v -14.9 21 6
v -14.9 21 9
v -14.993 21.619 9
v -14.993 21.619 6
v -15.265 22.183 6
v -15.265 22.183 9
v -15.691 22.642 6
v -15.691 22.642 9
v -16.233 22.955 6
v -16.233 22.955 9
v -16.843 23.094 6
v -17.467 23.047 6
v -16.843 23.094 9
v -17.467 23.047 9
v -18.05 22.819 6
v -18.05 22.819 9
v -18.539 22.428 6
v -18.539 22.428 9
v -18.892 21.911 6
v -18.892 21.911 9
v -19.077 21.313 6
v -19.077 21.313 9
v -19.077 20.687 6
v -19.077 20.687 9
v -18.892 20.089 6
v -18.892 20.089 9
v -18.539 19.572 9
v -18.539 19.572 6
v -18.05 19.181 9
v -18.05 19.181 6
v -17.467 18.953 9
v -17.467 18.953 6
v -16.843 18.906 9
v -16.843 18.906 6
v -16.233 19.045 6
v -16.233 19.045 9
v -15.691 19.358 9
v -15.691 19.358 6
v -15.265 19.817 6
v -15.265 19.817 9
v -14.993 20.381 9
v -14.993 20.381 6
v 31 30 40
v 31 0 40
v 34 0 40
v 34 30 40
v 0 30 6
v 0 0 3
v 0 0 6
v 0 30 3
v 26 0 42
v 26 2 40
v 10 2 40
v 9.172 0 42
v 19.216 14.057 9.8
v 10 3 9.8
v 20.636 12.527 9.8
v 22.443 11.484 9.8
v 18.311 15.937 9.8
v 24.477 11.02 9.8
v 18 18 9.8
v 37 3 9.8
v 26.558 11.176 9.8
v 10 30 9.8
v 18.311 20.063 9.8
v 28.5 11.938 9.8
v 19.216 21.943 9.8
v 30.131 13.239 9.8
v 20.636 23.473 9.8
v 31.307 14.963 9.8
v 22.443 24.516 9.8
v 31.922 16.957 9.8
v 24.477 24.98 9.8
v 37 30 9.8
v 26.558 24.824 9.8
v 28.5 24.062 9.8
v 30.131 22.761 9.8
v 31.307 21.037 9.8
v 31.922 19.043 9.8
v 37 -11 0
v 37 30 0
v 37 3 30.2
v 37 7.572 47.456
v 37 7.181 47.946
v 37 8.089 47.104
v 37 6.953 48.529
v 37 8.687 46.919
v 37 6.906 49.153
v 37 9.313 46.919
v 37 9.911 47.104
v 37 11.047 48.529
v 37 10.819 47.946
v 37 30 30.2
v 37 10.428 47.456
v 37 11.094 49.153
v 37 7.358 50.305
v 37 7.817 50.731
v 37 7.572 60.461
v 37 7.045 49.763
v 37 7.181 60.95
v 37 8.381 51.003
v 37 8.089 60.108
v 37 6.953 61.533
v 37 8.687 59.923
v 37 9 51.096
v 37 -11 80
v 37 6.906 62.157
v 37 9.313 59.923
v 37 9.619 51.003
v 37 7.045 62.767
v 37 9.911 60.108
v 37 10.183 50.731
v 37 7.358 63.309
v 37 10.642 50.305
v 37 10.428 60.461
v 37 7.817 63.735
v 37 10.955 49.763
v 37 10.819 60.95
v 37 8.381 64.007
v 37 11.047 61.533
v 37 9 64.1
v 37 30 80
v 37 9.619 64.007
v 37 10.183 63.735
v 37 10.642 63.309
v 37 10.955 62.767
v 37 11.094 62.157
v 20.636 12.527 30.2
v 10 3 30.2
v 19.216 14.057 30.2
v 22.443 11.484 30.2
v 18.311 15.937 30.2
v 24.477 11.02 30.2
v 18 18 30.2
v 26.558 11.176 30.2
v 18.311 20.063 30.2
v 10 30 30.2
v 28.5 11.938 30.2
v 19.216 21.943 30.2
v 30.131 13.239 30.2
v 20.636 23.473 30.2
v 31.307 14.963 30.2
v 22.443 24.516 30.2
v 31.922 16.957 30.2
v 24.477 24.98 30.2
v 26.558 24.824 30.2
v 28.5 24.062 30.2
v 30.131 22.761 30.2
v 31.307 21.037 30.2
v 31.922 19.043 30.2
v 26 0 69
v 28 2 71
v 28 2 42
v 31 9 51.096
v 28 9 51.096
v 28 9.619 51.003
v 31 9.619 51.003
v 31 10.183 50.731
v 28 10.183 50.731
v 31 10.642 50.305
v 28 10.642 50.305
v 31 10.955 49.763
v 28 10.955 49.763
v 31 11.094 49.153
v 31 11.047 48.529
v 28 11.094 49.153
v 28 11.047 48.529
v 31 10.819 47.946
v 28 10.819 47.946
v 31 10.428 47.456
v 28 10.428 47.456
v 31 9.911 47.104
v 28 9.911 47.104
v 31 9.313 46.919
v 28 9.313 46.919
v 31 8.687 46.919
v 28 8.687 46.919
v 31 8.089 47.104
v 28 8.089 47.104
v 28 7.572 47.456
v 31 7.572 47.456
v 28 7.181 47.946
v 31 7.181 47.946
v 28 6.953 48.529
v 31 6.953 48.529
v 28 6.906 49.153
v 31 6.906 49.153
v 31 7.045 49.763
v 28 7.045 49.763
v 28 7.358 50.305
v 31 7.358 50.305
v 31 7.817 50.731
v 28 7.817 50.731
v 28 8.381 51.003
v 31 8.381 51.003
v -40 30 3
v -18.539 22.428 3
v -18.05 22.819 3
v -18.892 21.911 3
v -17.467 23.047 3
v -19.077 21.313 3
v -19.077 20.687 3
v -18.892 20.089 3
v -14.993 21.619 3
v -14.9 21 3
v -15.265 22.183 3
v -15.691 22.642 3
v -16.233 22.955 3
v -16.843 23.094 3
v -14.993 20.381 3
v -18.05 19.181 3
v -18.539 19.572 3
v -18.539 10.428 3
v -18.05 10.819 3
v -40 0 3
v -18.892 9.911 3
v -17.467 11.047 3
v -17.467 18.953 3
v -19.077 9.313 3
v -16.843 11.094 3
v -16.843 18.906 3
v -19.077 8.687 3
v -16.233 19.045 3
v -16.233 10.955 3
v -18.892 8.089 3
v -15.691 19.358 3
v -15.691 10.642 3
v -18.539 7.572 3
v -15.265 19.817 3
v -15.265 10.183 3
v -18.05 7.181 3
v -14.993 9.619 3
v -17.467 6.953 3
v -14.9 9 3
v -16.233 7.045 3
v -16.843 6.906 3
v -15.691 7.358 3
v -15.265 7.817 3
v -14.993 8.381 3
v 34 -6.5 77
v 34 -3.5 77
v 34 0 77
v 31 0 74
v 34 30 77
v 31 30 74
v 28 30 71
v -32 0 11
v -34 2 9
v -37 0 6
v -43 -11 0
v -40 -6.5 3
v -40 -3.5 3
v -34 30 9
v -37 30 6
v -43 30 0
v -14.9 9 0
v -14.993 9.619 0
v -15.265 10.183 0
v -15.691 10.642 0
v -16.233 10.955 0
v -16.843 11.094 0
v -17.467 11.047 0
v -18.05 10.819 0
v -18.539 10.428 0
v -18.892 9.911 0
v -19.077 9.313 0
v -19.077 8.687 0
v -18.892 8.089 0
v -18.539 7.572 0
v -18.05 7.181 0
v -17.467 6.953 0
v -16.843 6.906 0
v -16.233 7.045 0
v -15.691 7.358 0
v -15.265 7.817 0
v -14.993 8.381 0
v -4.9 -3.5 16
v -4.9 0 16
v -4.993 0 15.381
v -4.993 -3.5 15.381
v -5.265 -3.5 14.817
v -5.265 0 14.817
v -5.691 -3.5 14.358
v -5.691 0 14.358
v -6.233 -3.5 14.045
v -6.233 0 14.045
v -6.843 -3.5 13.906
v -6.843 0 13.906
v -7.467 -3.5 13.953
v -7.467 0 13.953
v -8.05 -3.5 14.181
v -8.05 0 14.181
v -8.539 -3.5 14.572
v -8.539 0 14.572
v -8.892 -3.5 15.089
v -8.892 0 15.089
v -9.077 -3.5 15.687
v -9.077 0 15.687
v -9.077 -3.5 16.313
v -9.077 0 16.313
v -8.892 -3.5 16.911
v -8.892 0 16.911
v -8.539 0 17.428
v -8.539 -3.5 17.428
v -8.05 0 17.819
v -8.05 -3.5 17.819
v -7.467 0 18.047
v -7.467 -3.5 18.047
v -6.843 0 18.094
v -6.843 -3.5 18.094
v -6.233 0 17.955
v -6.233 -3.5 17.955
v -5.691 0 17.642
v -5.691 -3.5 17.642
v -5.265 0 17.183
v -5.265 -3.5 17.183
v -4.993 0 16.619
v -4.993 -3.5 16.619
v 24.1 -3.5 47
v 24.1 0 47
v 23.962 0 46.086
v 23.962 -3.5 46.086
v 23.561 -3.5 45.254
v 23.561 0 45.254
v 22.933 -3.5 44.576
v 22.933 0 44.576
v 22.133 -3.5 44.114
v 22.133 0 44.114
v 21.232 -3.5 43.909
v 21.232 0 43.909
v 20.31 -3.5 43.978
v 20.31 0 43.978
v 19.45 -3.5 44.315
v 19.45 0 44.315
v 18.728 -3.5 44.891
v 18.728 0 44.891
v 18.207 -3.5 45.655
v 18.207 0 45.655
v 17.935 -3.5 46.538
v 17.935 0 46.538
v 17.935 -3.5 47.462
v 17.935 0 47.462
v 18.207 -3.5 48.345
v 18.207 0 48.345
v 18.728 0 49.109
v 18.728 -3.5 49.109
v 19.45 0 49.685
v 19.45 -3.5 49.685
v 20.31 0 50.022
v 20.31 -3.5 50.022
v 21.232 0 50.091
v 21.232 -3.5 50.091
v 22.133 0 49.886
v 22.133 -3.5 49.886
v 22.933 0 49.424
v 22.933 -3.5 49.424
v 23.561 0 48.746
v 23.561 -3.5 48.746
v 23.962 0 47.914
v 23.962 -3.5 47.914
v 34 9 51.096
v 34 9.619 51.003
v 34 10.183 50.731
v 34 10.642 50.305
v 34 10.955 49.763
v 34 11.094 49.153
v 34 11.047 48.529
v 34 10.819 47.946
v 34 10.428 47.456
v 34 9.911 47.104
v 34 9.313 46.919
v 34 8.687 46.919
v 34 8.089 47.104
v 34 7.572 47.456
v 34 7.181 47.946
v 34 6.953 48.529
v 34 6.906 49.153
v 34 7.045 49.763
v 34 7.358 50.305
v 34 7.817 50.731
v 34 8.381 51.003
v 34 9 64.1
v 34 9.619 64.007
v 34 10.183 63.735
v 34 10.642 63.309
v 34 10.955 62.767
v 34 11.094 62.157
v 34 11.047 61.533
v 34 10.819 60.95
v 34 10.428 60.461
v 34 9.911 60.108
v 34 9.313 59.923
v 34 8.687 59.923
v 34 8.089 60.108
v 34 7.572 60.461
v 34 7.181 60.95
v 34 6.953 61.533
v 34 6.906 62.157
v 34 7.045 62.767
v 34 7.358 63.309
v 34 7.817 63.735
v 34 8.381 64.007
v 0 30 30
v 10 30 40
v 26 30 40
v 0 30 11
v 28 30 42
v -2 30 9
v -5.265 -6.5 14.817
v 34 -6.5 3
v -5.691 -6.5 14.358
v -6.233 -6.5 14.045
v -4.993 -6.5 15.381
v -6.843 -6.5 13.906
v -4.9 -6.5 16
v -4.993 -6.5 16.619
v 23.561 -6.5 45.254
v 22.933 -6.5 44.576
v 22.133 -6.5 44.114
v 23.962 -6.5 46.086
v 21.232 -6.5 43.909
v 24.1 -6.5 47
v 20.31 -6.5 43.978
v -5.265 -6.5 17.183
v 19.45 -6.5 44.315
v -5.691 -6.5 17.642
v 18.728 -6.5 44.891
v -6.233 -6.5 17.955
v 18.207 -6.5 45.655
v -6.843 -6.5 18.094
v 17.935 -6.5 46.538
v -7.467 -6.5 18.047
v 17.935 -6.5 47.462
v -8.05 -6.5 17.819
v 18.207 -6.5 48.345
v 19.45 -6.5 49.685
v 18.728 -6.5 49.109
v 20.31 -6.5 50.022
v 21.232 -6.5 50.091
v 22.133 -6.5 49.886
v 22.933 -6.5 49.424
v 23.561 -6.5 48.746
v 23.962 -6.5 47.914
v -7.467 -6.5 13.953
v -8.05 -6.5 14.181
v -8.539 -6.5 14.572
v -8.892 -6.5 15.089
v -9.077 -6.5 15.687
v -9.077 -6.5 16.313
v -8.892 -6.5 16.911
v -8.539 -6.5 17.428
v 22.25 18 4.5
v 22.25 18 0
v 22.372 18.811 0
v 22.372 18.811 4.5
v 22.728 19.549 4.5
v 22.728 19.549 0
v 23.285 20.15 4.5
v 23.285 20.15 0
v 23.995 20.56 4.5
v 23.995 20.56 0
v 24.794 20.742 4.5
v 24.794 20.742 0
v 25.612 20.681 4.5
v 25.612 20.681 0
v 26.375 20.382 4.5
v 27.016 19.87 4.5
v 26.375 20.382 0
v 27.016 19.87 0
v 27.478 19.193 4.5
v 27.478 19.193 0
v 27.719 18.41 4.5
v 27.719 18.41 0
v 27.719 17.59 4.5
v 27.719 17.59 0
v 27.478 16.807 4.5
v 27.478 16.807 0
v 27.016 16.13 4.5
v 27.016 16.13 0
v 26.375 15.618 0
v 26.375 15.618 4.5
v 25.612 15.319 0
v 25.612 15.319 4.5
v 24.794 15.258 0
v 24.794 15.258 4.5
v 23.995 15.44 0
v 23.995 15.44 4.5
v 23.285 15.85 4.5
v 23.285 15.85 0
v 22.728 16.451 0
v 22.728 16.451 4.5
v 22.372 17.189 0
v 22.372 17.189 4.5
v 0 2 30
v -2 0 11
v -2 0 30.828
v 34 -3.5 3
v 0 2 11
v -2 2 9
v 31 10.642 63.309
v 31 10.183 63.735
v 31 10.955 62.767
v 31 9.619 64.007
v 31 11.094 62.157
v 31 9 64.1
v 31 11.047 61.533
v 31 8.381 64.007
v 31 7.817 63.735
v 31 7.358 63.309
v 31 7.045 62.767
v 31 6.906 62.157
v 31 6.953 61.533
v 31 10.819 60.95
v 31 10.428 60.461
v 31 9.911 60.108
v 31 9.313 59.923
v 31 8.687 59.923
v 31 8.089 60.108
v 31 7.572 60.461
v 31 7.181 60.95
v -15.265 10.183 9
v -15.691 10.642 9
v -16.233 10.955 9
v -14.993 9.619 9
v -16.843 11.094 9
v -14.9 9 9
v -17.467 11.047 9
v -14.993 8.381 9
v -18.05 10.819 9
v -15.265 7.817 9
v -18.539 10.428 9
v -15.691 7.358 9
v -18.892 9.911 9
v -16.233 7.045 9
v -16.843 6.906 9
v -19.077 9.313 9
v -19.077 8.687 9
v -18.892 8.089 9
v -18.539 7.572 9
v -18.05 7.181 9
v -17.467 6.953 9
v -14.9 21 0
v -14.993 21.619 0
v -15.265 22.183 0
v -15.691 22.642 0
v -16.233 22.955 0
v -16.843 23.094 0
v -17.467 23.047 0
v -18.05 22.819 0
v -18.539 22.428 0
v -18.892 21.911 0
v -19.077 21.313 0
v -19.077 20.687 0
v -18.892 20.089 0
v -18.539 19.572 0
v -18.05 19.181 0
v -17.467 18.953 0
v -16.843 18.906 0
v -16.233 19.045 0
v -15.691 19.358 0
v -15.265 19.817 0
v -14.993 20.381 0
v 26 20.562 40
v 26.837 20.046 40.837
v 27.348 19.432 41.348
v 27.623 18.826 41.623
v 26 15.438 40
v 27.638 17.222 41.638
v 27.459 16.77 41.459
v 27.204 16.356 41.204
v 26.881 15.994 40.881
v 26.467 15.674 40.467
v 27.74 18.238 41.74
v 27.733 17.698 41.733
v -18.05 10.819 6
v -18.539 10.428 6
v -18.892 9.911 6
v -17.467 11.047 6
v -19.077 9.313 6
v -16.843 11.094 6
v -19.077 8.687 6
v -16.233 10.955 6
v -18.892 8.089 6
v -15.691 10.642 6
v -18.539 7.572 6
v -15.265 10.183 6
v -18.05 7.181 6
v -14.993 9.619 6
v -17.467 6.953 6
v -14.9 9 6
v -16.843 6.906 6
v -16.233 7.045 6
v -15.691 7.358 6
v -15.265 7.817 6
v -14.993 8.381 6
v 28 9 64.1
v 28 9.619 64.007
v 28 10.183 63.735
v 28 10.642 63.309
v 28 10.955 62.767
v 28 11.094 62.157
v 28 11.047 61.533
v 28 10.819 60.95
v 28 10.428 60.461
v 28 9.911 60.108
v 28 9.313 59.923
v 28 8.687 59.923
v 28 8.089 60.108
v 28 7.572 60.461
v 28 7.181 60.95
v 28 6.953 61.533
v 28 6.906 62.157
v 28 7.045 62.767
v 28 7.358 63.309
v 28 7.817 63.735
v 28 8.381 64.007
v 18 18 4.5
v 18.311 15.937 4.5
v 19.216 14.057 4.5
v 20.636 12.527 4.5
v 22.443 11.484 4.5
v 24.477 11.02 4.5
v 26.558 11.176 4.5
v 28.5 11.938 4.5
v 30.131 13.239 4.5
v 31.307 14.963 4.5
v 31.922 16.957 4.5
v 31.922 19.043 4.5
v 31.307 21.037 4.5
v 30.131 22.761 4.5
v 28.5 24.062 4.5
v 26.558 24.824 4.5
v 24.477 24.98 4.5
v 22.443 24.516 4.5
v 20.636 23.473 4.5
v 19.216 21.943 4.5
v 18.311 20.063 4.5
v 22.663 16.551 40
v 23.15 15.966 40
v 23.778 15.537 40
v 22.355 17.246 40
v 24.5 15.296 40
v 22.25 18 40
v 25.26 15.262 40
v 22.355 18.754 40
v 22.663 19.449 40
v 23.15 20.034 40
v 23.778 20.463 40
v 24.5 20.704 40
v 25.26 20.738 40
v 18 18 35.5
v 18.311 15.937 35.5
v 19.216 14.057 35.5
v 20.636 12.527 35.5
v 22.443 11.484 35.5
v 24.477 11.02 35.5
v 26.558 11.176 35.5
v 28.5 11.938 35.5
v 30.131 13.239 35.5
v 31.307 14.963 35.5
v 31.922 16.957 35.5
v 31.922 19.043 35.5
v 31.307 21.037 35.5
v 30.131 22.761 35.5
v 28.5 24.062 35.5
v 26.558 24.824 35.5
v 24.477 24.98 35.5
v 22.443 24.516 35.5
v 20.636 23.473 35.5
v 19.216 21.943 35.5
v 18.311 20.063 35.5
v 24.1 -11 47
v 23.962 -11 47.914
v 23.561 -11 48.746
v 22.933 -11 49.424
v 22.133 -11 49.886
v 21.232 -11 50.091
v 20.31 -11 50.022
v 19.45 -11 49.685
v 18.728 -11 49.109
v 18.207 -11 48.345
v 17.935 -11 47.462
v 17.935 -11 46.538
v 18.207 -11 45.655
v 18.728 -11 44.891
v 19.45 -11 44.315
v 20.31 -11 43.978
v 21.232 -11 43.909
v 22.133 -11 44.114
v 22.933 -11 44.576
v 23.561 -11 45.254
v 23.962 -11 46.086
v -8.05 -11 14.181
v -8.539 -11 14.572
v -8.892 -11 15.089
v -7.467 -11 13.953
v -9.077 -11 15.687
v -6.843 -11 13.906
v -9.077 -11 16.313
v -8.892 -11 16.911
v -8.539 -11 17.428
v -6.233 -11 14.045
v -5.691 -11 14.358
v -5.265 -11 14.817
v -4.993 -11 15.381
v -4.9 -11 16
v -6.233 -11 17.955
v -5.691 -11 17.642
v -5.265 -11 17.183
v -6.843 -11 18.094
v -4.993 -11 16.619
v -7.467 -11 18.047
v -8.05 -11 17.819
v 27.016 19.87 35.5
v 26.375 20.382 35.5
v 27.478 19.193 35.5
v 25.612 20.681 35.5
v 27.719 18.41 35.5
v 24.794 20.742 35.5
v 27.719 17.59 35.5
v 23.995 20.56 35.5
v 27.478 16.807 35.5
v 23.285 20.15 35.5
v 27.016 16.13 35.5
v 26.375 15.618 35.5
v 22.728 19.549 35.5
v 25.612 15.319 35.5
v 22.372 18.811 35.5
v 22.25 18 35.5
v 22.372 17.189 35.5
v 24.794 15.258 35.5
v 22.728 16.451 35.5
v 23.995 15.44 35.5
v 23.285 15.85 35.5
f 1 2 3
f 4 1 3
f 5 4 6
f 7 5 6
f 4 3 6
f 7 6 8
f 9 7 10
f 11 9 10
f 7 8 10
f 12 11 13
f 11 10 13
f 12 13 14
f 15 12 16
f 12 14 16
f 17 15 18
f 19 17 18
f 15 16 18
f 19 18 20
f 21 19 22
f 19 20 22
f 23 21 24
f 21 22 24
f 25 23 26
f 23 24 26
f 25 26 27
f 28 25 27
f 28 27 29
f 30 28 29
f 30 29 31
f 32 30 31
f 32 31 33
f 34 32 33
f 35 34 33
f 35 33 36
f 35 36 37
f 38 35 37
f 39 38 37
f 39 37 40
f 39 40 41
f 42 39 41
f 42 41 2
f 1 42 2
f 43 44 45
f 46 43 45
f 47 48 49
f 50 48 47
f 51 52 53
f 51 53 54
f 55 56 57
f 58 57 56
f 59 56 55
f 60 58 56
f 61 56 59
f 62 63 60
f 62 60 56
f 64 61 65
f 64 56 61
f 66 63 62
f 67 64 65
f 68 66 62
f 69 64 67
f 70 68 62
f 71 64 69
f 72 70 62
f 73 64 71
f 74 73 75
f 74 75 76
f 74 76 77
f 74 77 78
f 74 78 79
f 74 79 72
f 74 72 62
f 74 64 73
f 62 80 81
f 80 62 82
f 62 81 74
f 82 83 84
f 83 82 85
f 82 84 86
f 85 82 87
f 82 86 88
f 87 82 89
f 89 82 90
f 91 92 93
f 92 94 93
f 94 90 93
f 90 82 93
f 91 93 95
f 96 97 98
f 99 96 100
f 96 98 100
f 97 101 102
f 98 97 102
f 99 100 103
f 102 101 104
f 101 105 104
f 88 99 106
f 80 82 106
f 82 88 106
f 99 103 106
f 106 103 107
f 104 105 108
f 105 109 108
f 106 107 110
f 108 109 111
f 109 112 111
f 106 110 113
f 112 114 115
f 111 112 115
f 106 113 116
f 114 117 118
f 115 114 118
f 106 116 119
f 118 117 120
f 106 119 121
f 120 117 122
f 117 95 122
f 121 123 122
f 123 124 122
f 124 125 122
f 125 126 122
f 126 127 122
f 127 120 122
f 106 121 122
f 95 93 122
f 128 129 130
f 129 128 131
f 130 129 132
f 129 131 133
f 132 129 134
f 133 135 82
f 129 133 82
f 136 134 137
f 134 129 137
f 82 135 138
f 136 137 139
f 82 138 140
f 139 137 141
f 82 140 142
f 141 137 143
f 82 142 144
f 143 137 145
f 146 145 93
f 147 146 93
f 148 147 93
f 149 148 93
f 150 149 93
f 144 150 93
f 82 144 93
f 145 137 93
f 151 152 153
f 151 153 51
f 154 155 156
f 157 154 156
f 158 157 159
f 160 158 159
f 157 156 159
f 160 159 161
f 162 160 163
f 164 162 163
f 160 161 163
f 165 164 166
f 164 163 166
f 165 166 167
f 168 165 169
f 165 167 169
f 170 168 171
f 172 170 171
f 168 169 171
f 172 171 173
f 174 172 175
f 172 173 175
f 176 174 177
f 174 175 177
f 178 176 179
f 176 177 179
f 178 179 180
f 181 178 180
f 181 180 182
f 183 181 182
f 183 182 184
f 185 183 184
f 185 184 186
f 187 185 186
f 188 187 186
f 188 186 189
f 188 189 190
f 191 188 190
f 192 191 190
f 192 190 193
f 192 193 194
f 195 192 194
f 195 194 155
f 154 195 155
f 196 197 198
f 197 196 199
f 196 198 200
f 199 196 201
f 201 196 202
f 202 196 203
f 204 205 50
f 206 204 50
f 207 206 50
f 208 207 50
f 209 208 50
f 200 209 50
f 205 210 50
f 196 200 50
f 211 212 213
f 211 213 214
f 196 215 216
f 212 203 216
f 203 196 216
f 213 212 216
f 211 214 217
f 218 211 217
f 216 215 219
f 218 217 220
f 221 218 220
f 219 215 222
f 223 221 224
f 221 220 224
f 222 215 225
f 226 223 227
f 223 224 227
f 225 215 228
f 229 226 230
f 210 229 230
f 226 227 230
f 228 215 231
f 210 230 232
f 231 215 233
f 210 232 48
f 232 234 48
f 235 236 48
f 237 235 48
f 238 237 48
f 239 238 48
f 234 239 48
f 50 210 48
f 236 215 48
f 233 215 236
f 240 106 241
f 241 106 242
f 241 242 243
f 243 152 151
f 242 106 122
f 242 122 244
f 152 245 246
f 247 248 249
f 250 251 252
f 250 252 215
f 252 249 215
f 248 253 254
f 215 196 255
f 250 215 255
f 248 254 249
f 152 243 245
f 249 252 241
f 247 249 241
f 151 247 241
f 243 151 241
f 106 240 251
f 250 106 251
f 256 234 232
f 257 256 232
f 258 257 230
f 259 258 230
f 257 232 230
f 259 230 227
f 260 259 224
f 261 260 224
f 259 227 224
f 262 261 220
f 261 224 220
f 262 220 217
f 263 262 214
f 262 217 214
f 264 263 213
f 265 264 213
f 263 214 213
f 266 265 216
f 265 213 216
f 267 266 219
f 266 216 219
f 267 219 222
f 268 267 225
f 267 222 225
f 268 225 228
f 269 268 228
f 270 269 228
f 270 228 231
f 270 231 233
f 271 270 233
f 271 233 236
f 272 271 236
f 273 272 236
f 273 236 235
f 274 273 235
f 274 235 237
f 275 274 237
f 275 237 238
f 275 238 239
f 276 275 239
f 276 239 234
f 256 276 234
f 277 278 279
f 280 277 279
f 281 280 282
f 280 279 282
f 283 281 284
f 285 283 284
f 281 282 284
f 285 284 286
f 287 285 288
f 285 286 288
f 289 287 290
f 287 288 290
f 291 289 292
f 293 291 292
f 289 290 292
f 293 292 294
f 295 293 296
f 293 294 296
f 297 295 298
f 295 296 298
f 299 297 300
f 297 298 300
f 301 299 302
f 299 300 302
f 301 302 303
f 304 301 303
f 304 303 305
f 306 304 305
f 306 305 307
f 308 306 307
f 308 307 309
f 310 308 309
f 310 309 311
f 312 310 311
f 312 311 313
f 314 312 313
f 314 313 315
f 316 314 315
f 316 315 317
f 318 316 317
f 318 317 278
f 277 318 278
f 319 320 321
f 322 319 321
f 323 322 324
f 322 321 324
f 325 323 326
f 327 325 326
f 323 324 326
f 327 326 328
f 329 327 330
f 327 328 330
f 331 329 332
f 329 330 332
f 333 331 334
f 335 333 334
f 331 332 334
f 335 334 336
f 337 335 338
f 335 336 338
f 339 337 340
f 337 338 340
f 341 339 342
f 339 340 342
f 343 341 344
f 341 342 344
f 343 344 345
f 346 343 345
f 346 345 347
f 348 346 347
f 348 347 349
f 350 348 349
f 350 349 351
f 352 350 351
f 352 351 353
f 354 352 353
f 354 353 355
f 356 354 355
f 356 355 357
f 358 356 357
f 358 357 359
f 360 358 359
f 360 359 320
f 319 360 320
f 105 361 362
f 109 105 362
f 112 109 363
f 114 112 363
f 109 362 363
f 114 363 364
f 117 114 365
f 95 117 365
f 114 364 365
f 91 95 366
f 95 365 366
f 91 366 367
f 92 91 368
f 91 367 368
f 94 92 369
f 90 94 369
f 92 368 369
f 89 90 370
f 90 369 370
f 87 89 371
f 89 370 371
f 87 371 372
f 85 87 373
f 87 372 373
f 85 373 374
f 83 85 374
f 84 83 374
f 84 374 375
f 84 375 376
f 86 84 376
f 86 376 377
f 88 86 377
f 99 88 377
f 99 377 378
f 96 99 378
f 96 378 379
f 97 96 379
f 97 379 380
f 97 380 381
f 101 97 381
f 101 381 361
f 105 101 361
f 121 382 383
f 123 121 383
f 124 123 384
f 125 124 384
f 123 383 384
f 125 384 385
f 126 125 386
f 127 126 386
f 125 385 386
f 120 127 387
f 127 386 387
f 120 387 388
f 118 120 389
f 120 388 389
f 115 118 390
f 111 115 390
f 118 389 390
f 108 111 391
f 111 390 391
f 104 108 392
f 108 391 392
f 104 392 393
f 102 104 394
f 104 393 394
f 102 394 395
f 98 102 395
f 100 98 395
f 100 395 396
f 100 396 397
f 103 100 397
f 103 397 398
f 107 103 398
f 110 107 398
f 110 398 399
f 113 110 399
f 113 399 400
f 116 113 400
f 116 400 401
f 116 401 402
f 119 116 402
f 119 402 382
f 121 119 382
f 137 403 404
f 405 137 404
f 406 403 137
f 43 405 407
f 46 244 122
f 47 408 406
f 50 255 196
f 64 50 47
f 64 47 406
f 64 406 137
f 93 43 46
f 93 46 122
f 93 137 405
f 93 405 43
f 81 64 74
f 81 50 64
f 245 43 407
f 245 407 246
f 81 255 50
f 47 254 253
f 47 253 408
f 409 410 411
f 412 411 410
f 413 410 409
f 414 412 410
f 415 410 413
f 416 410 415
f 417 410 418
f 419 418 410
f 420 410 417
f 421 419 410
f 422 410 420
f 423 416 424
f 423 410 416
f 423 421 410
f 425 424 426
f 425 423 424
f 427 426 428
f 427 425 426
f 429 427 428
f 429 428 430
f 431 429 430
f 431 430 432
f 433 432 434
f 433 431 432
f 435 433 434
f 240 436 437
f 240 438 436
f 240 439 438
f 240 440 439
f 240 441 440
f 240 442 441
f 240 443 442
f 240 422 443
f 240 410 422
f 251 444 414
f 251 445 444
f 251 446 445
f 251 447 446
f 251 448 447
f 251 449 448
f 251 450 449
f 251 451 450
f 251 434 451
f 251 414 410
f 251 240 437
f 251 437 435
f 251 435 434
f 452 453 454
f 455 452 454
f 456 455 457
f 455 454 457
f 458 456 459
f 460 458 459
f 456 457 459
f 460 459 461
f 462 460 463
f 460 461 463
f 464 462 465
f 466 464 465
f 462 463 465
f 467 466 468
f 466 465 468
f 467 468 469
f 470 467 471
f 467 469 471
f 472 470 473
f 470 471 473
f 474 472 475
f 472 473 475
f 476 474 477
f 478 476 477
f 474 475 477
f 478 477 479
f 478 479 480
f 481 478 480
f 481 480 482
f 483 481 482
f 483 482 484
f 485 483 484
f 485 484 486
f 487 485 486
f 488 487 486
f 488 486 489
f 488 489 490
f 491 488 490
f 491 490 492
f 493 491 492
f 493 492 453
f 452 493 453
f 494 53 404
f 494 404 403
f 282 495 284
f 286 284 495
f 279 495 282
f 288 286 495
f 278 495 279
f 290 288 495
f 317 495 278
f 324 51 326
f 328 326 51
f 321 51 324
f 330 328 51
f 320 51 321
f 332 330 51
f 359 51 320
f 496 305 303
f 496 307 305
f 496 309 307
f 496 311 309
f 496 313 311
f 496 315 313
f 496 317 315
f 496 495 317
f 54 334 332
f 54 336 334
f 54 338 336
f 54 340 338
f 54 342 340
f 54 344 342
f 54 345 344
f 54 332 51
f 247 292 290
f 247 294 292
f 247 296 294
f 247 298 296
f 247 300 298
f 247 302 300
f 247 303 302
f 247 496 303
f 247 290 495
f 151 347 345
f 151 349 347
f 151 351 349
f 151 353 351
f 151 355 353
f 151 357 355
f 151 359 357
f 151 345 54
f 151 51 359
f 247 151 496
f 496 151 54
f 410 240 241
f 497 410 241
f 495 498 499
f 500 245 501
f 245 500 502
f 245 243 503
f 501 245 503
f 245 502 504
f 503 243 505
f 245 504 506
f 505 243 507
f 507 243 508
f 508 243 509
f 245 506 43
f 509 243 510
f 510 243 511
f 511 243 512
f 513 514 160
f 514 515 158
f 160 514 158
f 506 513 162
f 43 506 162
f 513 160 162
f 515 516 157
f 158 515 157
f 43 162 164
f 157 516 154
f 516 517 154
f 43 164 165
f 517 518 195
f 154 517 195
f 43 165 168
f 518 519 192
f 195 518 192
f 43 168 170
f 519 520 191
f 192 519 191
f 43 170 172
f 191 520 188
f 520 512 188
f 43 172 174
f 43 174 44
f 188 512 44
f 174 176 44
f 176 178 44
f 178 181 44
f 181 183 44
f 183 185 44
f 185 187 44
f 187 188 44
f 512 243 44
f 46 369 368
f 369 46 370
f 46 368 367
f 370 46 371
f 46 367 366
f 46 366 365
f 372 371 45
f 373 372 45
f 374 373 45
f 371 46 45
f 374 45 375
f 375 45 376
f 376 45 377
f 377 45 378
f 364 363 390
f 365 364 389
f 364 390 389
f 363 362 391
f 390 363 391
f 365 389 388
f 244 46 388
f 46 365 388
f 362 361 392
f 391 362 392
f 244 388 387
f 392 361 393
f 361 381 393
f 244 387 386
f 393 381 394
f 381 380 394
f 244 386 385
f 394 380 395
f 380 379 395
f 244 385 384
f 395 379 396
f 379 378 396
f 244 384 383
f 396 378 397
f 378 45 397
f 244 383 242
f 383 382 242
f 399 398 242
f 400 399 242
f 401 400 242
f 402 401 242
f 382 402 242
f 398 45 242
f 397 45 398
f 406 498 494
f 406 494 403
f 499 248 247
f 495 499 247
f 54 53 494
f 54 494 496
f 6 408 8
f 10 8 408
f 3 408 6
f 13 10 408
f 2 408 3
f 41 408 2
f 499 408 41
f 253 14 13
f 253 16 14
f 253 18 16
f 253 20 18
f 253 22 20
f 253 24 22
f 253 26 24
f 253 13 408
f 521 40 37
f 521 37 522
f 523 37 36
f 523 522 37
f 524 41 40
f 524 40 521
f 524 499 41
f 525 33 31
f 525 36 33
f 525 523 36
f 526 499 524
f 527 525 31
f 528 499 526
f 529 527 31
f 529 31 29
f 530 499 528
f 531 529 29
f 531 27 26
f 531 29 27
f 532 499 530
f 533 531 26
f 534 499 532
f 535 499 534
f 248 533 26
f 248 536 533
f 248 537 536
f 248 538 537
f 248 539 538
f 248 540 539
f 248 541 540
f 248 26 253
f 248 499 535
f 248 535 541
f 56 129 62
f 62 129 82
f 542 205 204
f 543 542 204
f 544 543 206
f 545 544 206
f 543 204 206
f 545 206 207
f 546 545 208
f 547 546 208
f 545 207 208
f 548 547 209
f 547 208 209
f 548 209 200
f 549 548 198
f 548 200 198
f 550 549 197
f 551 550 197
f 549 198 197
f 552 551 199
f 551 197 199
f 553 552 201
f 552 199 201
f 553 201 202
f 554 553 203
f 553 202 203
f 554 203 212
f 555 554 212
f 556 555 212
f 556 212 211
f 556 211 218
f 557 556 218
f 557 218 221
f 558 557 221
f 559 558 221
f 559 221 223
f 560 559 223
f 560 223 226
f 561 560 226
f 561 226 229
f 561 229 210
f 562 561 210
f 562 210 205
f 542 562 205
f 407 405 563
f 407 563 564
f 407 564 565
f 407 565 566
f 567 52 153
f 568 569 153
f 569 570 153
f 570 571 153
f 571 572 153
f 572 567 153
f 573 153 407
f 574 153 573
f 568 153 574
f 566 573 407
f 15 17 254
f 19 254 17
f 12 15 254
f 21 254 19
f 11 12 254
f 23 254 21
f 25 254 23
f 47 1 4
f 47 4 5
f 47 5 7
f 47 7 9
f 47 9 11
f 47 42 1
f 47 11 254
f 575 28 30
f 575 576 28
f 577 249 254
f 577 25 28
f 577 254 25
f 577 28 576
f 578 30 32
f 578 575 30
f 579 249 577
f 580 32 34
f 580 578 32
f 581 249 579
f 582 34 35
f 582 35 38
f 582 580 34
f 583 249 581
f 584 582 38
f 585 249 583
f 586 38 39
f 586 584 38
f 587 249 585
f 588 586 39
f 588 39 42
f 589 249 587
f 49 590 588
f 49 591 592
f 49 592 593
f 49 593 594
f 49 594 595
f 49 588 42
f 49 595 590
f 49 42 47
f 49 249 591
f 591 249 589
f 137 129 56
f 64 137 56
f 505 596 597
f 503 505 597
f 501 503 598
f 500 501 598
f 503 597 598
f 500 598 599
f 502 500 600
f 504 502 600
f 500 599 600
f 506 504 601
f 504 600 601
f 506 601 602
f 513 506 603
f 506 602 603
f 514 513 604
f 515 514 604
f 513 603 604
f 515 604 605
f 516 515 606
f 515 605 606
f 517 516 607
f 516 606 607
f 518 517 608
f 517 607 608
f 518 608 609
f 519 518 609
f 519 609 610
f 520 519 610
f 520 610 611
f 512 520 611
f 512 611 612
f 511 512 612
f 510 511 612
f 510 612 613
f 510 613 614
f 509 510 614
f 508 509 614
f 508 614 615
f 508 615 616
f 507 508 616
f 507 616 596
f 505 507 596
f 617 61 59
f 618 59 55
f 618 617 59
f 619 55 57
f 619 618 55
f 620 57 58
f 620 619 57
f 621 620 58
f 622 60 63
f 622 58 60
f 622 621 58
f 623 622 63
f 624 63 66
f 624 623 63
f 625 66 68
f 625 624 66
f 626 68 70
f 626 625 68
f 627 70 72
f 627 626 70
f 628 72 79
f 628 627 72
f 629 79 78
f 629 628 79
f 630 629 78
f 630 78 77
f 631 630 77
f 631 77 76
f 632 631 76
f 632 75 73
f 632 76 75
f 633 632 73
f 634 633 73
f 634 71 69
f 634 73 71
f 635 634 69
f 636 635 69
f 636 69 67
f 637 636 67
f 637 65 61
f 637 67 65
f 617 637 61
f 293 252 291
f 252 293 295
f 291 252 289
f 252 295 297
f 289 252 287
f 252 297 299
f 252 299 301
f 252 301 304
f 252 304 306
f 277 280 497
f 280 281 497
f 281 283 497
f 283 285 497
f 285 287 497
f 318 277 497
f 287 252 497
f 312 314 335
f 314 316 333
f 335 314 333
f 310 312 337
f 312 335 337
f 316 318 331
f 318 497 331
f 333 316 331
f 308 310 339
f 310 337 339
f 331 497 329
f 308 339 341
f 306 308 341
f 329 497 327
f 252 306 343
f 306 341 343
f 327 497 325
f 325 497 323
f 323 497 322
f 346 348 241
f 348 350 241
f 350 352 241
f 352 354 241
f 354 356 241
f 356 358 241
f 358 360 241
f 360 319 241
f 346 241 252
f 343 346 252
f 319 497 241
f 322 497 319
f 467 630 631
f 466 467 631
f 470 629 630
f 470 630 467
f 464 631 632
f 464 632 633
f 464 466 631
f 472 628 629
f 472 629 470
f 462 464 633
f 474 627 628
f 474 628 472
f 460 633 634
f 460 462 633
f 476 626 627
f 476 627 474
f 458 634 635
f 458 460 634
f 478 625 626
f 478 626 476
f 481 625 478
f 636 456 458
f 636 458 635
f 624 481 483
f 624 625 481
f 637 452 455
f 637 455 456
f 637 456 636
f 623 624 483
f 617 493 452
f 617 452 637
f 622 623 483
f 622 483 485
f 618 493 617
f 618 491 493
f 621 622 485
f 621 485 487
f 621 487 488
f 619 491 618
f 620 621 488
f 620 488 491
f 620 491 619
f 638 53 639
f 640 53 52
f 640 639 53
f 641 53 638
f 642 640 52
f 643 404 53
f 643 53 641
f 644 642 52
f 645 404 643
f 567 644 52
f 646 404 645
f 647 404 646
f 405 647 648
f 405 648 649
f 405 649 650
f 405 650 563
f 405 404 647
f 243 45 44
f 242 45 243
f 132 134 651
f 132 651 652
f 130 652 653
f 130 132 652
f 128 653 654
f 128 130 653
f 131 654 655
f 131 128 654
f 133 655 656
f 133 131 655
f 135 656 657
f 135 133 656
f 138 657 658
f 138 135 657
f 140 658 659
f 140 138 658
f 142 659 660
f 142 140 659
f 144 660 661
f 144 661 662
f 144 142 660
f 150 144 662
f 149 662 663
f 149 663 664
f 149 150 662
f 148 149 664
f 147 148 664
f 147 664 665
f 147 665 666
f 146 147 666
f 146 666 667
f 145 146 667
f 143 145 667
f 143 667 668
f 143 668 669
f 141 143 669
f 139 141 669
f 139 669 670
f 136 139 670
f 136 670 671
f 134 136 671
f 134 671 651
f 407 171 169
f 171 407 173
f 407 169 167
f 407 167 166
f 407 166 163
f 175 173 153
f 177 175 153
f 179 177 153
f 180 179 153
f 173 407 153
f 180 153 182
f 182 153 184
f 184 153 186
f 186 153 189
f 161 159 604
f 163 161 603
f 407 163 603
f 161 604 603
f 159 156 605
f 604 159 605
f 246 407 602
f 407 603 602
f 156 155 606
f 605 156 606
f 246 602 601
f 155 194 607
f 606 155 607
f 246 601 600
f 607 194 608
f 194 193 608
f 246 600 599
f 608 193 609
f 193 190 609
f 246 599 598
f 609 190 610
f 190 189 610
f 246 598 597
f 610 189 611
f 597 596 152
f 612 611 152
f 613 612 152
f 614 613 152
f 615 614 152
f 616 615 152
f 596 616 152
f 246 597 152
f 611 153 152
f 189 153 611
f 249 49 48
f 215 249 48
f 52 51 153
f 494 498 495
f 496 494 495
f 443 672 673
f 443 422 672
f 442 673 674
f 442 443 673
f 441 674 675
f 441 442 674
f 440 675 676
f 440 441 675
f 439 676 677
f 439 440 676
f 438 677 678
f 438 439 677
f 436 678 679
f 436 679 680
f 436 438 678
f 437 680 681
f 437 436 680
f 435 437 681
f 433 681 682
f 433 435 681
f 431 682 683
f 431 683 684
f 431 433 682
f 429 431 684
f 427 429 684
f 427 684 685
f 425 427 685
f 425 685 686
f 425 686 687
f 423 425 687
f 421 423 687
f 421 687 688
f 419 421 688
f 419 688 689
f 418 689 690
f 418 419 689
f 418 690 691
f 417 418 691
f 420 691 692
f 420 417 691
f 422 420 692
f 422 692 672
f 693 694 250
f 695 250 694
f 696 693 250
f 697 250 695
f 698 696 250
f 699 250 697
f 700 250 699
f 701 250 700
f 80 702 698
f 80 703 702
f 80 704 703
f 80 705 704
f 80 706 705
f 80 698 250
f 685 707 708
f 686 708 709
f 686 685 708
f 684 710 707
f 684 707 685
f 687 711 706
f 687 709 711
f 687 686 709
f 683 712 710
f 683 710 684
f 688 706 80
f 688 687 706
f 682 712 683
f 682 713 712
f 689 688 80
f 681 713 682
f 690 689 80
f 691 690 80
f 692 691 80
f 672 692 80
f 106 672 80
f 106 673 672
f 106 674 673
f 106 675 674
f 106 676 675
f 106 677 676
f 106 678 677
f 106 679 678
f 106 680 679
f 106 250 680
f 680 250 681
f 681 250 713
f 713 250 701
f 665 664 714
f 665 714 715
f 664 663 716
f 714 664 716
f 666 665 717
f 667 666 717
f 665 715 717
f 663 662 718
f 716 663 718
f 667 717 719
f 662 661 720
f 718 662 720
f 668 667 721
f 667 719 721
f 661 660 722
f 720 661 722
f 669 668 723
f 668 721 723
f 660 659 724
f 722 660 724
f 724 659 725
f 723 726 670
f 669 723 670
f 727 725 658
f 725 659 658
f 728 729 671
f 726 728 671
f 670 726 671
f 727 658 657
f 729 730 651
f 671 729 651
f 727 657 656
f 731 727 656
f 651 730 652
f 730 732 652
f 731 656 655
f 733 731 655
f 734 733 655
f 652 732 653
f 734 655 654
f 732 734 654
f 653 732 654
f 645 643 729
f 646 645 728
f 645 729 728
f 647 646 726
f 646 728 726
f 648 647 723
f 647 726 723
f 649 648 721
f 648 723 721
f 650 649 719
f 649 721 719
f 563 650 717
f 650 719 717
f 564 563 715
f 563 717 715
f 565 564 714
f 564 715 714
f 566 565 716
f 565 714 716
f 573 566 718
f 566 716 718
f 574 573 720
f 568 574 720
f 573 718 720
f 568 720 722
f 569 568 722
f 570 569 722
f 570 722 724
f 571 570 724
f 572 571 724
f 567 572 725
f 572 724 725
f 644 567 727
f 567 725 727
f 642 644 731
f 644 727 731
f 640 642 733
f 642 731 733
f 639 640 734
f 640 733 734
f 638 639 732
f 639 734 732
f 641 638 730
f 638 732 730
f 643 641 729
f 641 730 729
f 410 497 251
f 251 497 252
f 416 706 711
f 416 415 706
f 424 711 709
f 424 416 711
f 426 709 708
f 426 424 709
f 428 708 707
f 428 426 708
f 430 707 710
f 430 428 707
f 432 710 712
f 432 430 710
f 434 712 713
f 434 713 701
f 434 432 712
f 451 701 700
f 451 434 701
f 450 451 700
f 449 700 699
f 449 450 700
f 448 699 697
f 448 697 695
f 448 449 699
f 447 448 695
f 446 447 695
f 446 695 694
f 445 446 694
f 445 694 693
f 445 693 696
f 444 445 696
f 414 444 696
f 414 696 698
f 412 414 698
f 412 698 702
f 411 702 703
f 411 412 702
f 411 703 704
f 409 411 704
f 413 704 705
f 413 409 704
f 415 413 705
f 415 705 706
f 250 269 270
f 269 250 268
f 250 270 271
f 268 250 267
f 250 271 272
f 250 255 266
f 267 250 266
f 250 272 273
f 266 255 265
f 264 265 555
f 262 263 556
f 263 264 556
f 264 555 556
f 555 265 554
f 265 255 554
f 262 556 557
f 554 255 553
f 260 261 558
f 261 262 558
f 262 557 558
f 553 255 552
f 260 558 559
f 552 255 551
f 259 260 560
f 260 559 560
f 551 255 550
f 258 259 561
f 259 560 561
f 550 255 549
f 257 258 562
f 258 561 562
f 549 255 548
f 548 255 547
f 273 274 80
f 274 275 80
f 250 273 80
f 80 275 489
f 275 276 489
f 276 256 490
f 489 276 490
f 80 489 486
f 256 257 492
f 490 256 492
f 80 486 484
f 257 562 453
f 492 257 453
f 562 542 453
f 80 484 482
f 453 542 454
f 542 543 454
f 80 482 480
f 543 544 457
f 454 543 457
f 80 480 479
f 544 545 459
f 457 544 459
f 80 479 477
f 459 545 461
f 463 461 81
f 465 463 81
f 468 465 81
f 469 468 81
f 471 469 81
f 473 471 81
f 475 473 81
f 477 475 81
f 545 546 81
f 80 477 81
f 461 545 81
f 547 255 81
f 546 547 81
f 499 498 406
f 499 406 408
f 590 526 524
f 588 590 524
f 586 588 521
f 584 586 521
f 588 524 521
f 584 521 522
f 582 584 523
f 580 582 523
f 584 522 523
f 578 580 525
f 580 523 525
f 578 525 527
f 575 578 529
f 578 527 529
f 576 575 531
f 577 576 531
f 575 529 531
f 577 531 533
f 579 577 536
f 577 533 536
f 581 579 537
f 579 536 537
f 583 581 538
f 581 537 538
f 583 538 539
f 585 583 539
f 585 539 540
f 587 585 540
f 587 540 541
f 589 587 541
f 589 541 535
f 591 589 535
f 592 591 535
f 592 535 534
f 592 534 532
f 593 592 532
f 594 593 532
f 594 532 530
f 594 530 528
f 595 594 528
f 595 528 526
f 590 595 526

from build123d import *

# Parameters (mm, degrees)
SZKIC1_W                        = 37
SZKIC1_H                        = 30
DODANIE_WYCI_GNI_CIE1_DEPTH     = 40
SZKIC2_W                        = 27
SZKIC2_H                        = 20.4
WYTNIJ_WYCI_GNI_CIE1_DEPTH      = 30
WYTNIJ_WYCI_GNI_CIE2_DEPTH      = 15.5
WYTNIJ_WYCI_GNI_CIE2_DEPTH_BACK = 15.5
SZKIC3_R                        = 7
SZKIC4_R                        = 2.75
WYTNIJ_WYCI_GNI_CIE3_DEPTH      = 63.20128616
SZKIC5_W                        = 27
SZKIC5_H                        = 20.4
DODANIE_WYCI_GNI_CIE2_DEPTH     = 3
DODANIE_WYCI_GNI_CIE3_DEPTH     = 10
SZKIC8_W                        = 74
SZKIC8_H                        = 3
WYTNIJ_WYCI_GNI_CIE4_DEPTH      = 77
DODANIE_WYCI_GNI_CIE4_DEPTH     = 30
DODANIE_WYCI_GNI_CIE5_DEPTH     = 30
SZKIC11_R                       = 2.1
SZKIC11_R_2                     = 3.1
WYTNIJ_WYCI_GNI_CIE5_DEPTH      = 77
SZKIC12_R                       = 2.1
WYTNIJ_WYCI_GNI_CIE6_DEPTH      = 77
SFAZOWANIE2_SIZE                = 10
SFAZOWANIE3_SIZE                = 2
SZKIC13_R                       = 2.1
WYTNIJ_WYCI_GNI_CIE7_DEPTH      = 77
SZKIC14_R                       = 3.1
SZKIC14_R_2                     = 2.1
DODANIE_WYCI_GNI_CIE6_DEPTH     = 1


with BuildPart() as part:
    # Szkic1 → Dodanie-wyciągnięcie1 (new body)
    with BuildSketch(Plane.XY):
        with Locations((18.5, 15)):
            Rectangle(SZKIC1_W, SZKIC1_H)
    extrude(amount=DODANIE_WYCI_GNI_CIE1_DEPTH)

    # Szkic2 → Wytnij-wyciągnięcie1 (cut)
    with BuildSketch(Plane(origin=(0, 30, 0), x_dir=(1, 0, 0), z_dir=(0, 1, 0))):
        with Locations((23.5, -20)):
            Rectangle(SZKIC2_W, SZKIC2_H)
    extrude(amount=-WYTNIJ_WYCI_GNI_CIE1_DEPTH, mode=Mode.SUBTRACT)

    # Szkic3 → Wytnij-wyciągnięcie2 (cut, two sides: drawn at the far end of the back side and taken through both)
    with BuildSketch(Plane.XY.offset(20).offset(-WYTNIJ_WYCI_GNI_CIE2_DEPTH_BACK)):
        with Locations(Location((25, 18, 0), (0, 0, 180))):
            Circle(SZKIC3_R)
    extrude(amount=WYTNIJ_WYCI_GNI_CIE2_DEPTH + WYTNIJ_WYCI_GNI_CIE2_DEPTH_BACK, mode=Mode.SUBTRACT)

    # Szkic4 → Wytnij-wyciągnięcie3 (cut, through all)
    with BuildSketch(Plane(origin=(0, 0, 0), x_dir=(-1, 0, 0), z_dir=(0, 0, -1))):
        with Locations((-25, 18)):
            Circle(SZKIC4_R)
    extrude(amount=-WYTNIJ_WYCI_GNI_CIE3_DEPTH, mode=Mode.SUBTRACT)

    # Szkic5 → Dodanie-wyciągnięcie2 (add)
    with BuildSketch(Plane.XZ):
        with Locations((23.5, 20)):
            Rectangle(SZKIC5_W, SZKIC5_H)
    extrude(amount=-DODANIE_WYCI_GNI_CIE2_DEPTH)

    # Szkic6 → Dodanie-wyciągnięcie3 (add)
    with BuildSketch(Plane.XZ):
        Polygon((37, 0), (-43, 0), (37, 80), align=None)
    extrude(amount=DODANIE_WYCI_GNI_CIE3_DEPTH)

    # Szkic8 → Wytnij-wyciągnięcie4 (cut)
    with BuildSketch(Plane(origin=(0, 0, 80), x_dir=(-1, 0, 0), z_dir=(0, 0, -1))):
        with Locations((3, -5)):
            Rectangle(SZKIC8_W, SZKIC8_H)
    extrude(amount=WYTNIJ_WYCI_GNI_CIE4_DEPTH, mode=Mode.SUBTRACT)

    # Szkic9 → Dodanie-wyciągnięcie4 (add)
    with BuildSketch(Plane(origin=(0, 0, 0), x_dir=(1, 0, 0), z_dir=(0, 1, 0))):
        Polygon((0, 0), (-43, 0), (-40, -3), (0, -3), align=None)
        Polygon((0, -6), (0, -9), (-34, -9), (-37, -6), align=None)
    extrude(amount=DODANIE_WYCI_GNI_CIE4_DEPTH)

    # Szkic10 → Dodanie-wyciągnięcie5 (add)
    with BuildSketch(Plane(origin=(0, 0, 0), x_dir=(1, 0, 0), z_dir=(0, 1, 0))):
        Polygon((31, -74), (31, -40), (28, -40), (28, -71), align=None)
        Polygon((37, -80), (37, -40), (34, -40), (34, -77), align=None)
    extrude(amount=DODANIE_WYCI_GNI_CIE5_DEPTH)

    # Szkic11 → Wytnij-wyciągnięcie5 (cut)
    with BuildSketch(Plane(origin=(0, 0, 0), x_dir=(1, 0, 0), z_dir=(0, 1, 0))):
        with Locations((-7, -16)):
            Circle(SZKIC11_R)
        with Locations((21, -47)):
            Circle(SZKIC11_R_2)
    extrude(amount=-WYTNIJ_WYCI_GNI_CIE5_DEPTH, mode=Mode.SUBTRACT)

    # Szkic12 → Wytnij-wyciągnięcie6 (cut)
    with BuildSketch(Plane.XY.offset(9)):
        with Locations((-17, 21)):
            Circle(SZKIC12_R)
        with Locations((-17, 9)):
            Circle(SZKIC12_R)
    extrude(amount=-WYTNIJ_WYCI_GNI_CIE6_DEPTH, mode=Mode.SUBTRACT)

    # Sfazowanie2
    sfazowanie2_edges = [part.edges().sort_by_distance(p)[0] for p in [
        (0, 15, 40),
    ]]
    chamfer(sfazowanie2_edges, length=SFAZOWANIE2_SIZE)

    # Sfazowanie3
    # the kernel refuses this chamfer: 2 mm, written as the material it adds along each edge
    with BuildSketch(Plane(origin=(-1.333333333, 1.333333333, 10.333333333), x_dir=(0.7071067811865475, 0.7071067811865475, 0), z_dir=(0.5773502691896258, -0.5773502691896258, -0.5773502691896256))) as sfazowanie3_piece_1_section:
        Polygon((-1.414213562, 0.816496581), (1.414213562, 0.816496581), (0, -1.632993162), align=None)
    sfazowanie3_piece_1 = extrude(amount=2.540341184, mode=Mode.PRIVATE)
    sfazowanie3_piece_1 = split(sfazowanie3_piece_1, bisect_by=Plane(origin=(0, 0, 9), z_dir=(0, 1, 0)), keep=Keep.TOP, mode=Mode.PRIVATE)
    sfazowanie3_piece_1 = split(sfazowanie3_piece_1, bisect_by=Plane(origin=(0, 0, 9), z_dir=(-1, 0, 0)), keep=Keep.TOP, mode=Mode.PRIVATE)
    sfazowanie3_piece_1 = split(sfazowanie3_piece_1, bisect_by=Plane(origin=(0, 0, 9), z_dir=(0, 0, 1)), keep=Keep.TOP, mode=Mode.PRIVATE)
    add(sfazowanie3_piece_1)
    with BuildSketch(Plane(origin=(26.666666667, 1.333333333, 41.333333333), x_dir=(0, -0.7071067811865475, 0.7071067811865475), z_dir=(0.5773502691896257, -0.5773502691896258, -0.5773502691896258))) as sfazowanie3_piece_2_section:
        Polygon((-1.414213562, 0.816496581), (1.414213562, 0.816496581), (0, -1.632993162), align=None)
    sfazowanie3_piece_2 = extrude(amount=2.540341184, mode=Mode.PRIVATE)
    sfazowanie3_piece_2 = split(sfazowanie3_piece_2, bisect_by=Plane(origin=(28, 0, 40), z_dir=(0, 0, 1)), keep=Keep.TOP, mode=Mode.PRIVATE)
    sfazowanie3_piece_2 = split(sfazowanie3_piece_2, bisect_by=Plane(origin=(28, 0, 40), z_dir=(0, 1, 0)), keep=Keep.TOP, mode=Mode.PRIVATE)
    sfazowanie3_piece_2 = split(sfazowanie3_piece_2, bisect_by=Plane(origin=(28, 0, 40), z_dir=(-1, 0, 0)), keep=Keep.TOP, mode=Mode.PRIVATE)
    add(sfazowanie3_piece_2)
    with BuildSketch(Plane(origin=(0, -5.143365976, 9), x_dir=(0, 0, 1), z_dir=(0, 1, 0))) as sfazowanie3_piece_3_section:
        Polygon((SFAZOWANIE3_SIZE, 0), (0, -SFAZOWANIE3_SIZE), (0, 0), align=None)
    sfazowanie3_piece_3 = extrude(amount=35.143365976, mode=Mode.PRIVATE)
    sfazowanie3_piece_3 = split(sfazowanie3_piece_3, bisect_by=Plane(origin=(0, -3.5, 9), z_dir=(0, 1, 0)), keep=Keep.TOP, mode=Mode.PRIVATE)
    add(sfazowanie3_piece_3)
    with BuildSketch(Plane(origin=(5.143365976, 0, 9), x_dir=(0, 1, 0), z_dir=(-1, 0, 0))) as sfazowanie3_piece_4_section:
        Polygon((SFAZOWANIE3_SIZE, 0), (0, -SFAZOWANIE3_SIZE), (0, 0), align=None)
    sfazowanie3_piece_4 = extrude(amount=44.286731952, mode=Mode.PRIVATE)
    sfazowanie3_piece_4 = split(sfazowanie3_piece_4, bisect_by=Plane(origin=(-14.428317012, 0, 28.571682988), z_dir=(0.7071067811865476, 0, -0.7071067811865475)), keep=Keep.TOP, mode=Mode.PRIVATE)
    add(sfazowanie3_piece_4)
    with BuildSketch(Plane(origin=(28, -5.143365976, 40), x_dir=(-1, 0, 0), z_dir=(0, 1, 0))) as sfazowanie3_piece_5_section:
        Polygon((SFAZOWANIE3_SIZE, 0), (0, SFAZOWANIE3_SIZE), (0, 0), align=None)
    sfazowanie3_piece_5 = extrude(amount=35.143365976, mode=Mode.PRIVATE)
    sfazowanie3_piece_5 = sfazowanie3_piece_5 - Plane(origin=(25, 18, 40), x_dir=(-1, 0, 0), z_dir=(0, 0, -1)) * Cylinder(2.75, 79, mode=Mode.PRIVATE)
    sfazowanie3_piece_5 = split(sfazowanie3_piece_5, bisect_by=Plane(origin=(28, -3.5, 40), z_dir=(0, 1, 0)), keep=Keep.TOP, mode=Mode.PRIVATE)
    add(sfazowanie3_piece_5)
    with BuildSketch(Plane(origin=(28, 0, 34.856634024), x_dir=(0, 1, 0), z_dir=(0, 0, 1))) as sfazowanie3_piece_6_section:
        Polygon((SFAZOWANIE3_SIZE, 0), (0, SFAZOWANIE3_SIZE), (0, 0), align=None)
    sfazowanie3_piece_6 = extrude(amount=41.286731952, mode=Mode.PRIVATE)
    sfazowanie3_piece_6 = split(sfazowanie3_piece_6, bisect_by=Plane(origin=(9.928317012, 0, 52.928317012), z_dir=(0.7071067811865476, 0, -0.7071067811865475)), keep=Keep.TOP, mode=Mode.PRIVATE)
    add(sfazowanie3_piece_6)
    with BuildSketch(Plane(origin=(4.856634024, 0, 40), x_dir=(0, 1, 0), z_dir=(1, 0, 0))) as sfazowanie3_piece_7_section:
        Polygon((SFAZOWANIE3_SIZE, 0), (0, SFAZOWANIE3_SIZE), (0, 0), align=None)
    sfazowanie3_piece_7 = extrude(amount=28.286731952, mode=Mode.PRIVATE)
    sfazowanie3_piece_7 = split(sfazowanie3_piece_7, bisect_by=Plane(origin=(7.428317012, 0, 37.428317012), z_dir=(0.7071067811865476, 0, -0.7071067811865476)), keep=Keep.TOP, mode=Mode.PRIVATE)
    sfazowanie3_piece_7 = split(sfazowanie3_piece_7, bisect_by=Plane(origin=(31, 0, 40), z_dir=(-1, 0, 0)), keep=Keep.TOP, mode=Mode.PRIVATE)
    add(sfazowanie3_piece_7)
    with BuildSketch(Plane(origin=(0, 0, 3.856634024), x_dir=(0, 1, 0), z_dir=(0, 0, 1))) as sfazowanie3_piece_8_section:
        Polygon((SFAZOWANIE3_SIZE, 0), (0, SFAZOWANIE3_SIZE), (0, 0), align=None)
    sfazowanie3_piece_8 = extrude(amount=31.286731952, mode=Mode.PRIVATE)
    sfazowanie3_piece_8 = split(sfazowanie3_piece_8, bisect_by=Plane(origin=(-13.071682988, 0, 16.928317012), z_dir=(0.7071067811865476, 0, -0.7071067811865476)), keep=Keep.TOP, mode=Mode.PRIVATE)
    sfazowanie3_piece_8 = split(sfazowanie3_piece_8, bisect_by=Plane(origin=(0, 0, 6), z_dir=(0, 0, 1)), keep=Keep.TOP, mode=Mode.PRIVATE)
    add(sfazowanie3_piece_8)
    with BuildSketch(Plane(origin=(13.63690896, 0, 43.63690896), x_dir=(0, 1, 0), z_dir=(-0.7071067811865476, 0, -0.7071067811865476))) as sfazowanie3_piece_9_section:
        Polygon((SFAZOWANIE3_SIZE, 0), (0, -SFAZOWANIE3_SIZE), (0, 0), align=None)
    sfazowanie3_piece_9 = extrude(amount=24.428867576, mode=Mode.PRIVATE)
    sfazowanie3_piece_9 = split(sfazowanie3_piece_9, bisect_by=Plane(origin=(13.63690896, 0, 40), z_dir=(0, 0, -1)), keep=Keep.TOP, mode=Mode.PRIVATE)
    sfazowanie3_piece_9 = split(sfazowanie3_piece_9, bisect_by=Plane(origin=(0, 0, 43.63690896), z_dir=(1, 0, 0)), keep=Keep.TOP, mode=Mode.PRIVATE)
    add(sfazowanie3_piece_9)
    with BuildSketch(Plane(origin=(4.856634024, 0, 40), x_dir=(0, 1, 0), z_dir=(1, 0, 0))) as sfazowanie3_piece_10a_section:
        Polygon((SFAZOWANIE3_SIZE, 0), (0, SFAZOWANIE3_SIZE), (0, 0), align=None)
    sfazowanie3_piece_10a = extrude(amount=23.143365976, mode=Mode.PRIVATE)
    sfazowanie3_piece_10a = split(sfazowanie3_piece_10a, bisect_by=Plane(origin=(7.428317012, 0, 37.428317012), z_dir=(-0.7071067811865476, 0, 0.7071067811865476)), keep=Keep.TOP, mode=Mode.PRIVATE)
    with BuildSketch(Plane(origin=(13.63690896, 0, 43.63690896), x_dir=(0, 1, 0), z_dir=(-0.7071067811865476, 0, -0.7071067811865476))) as sfazowanie3_piece_10b_section:
        Polygon((SFAZOWANIE3_SIZE, 0), (0, -SFAZOWANIE3_SIZE), (0, 0), align=None)
    sfazowanie3_piece_10b = extrude(amount=24.428867576, mode=Mode.PRIVATE)
    sfazowanie3_piece_10b = split(sfazowanie3_piece_10b, bisect_by=Plane(origin=(13.63690896, 0, 40), z_dir=(0, 0, 1)), keep=Keep.TOP, mode=Mode.PRIVATE)
    sfazowanie3_piece_10 = sfazowanie3_piece_10a & sfazowanie3_piece_10b
    add(sfazowanie3_piece_10)
    with BuildSketch(Plane(origin=(13.63690896, 0, 43.63690896), x_dir=(0, 1, 0), z_dir=(-0.7071067811865476, 0, -0.7071067811865476))) as sfazowanie3_piece_11a_section:
        Polygon((SFAZOWANIE3_SIZE, 0), (0, -SFAZOWANIE3_SIZE), (0, 0), align=None)
    sfazowanie3_piece_11a = extrude(amount=24.428867576, mode=Mode.PRIVATE)
    sfazowanie3_piece_11a = split(sfazowanie3_piece_11a, bisect_by=Plane(origin=(0, 0, 43.63690896), z_dir=(-1, 0, 0)), keep=Keep.TOP, mode=Mode.PRIVATE)
    with BuildSketch(Plane(origin=(0, 0, 9), x_dir=(0, 1, 0), z_dir=(0, 0, 1))) as sfazowanie3_piece_11b_section:
        Polygon((SFAZOWANIE3_SIZE, 0), (0, SFAZOWANIE3_SIZE), (0, 0), align=None)
    sfazowanie3_piece_11b = extrude(amount=26.143365976, mode=Mode.PRIVATE)
    sfazowanie3_piece_11b = split(sfazowanie3_piece_11b, bisect_by=Plane(origin=(-10.5, 0, 19.5), z_dir=(-0.7071067811865476, 0, 0.7071067811865476)), keep=Keep.TOP, mode=Mode.PRIVATE)
    sfazowanie3_piece_11 = sfazowanie3_piece_11a & sfazowanie3_piece_11b
    add(sfazowanie3_piece_11)

    # Szkic13 → Wytnij-wyciągnięcie7 (cut)
    with BuildSketch(Plane.ZY.offset(-28)):
        with Locations((48.995840686, 9)):
            Circle(SZKIC13_R)
        with Locations((62, 9)):
            Circle(SZKIC13_R)
    extrude(amount=-WYTNIJ_WYCI_GNI_CIE7_DEPTH, mode=Mode.SUBTRACT)

    # Szkic14 → Dodanie-wyciągnięcie6 (add)
    with BuildSketch(Plane.XZ.offset(10)):
        Polygon((37, 0), (37, 80), (-43, 0), align=None)
        with Locations((21, 47)):
            Circle(SZKIC14_R, mode=Mode.SUBTRACT)
        with Locations((-7, 16)):
            Circle(SZKIC14_R_2, mode=Mode.SUBTRACT)
    extrude(amount=DODANIE_WYCI_GNI_CIE6_DEPTH)


solid = part.part
